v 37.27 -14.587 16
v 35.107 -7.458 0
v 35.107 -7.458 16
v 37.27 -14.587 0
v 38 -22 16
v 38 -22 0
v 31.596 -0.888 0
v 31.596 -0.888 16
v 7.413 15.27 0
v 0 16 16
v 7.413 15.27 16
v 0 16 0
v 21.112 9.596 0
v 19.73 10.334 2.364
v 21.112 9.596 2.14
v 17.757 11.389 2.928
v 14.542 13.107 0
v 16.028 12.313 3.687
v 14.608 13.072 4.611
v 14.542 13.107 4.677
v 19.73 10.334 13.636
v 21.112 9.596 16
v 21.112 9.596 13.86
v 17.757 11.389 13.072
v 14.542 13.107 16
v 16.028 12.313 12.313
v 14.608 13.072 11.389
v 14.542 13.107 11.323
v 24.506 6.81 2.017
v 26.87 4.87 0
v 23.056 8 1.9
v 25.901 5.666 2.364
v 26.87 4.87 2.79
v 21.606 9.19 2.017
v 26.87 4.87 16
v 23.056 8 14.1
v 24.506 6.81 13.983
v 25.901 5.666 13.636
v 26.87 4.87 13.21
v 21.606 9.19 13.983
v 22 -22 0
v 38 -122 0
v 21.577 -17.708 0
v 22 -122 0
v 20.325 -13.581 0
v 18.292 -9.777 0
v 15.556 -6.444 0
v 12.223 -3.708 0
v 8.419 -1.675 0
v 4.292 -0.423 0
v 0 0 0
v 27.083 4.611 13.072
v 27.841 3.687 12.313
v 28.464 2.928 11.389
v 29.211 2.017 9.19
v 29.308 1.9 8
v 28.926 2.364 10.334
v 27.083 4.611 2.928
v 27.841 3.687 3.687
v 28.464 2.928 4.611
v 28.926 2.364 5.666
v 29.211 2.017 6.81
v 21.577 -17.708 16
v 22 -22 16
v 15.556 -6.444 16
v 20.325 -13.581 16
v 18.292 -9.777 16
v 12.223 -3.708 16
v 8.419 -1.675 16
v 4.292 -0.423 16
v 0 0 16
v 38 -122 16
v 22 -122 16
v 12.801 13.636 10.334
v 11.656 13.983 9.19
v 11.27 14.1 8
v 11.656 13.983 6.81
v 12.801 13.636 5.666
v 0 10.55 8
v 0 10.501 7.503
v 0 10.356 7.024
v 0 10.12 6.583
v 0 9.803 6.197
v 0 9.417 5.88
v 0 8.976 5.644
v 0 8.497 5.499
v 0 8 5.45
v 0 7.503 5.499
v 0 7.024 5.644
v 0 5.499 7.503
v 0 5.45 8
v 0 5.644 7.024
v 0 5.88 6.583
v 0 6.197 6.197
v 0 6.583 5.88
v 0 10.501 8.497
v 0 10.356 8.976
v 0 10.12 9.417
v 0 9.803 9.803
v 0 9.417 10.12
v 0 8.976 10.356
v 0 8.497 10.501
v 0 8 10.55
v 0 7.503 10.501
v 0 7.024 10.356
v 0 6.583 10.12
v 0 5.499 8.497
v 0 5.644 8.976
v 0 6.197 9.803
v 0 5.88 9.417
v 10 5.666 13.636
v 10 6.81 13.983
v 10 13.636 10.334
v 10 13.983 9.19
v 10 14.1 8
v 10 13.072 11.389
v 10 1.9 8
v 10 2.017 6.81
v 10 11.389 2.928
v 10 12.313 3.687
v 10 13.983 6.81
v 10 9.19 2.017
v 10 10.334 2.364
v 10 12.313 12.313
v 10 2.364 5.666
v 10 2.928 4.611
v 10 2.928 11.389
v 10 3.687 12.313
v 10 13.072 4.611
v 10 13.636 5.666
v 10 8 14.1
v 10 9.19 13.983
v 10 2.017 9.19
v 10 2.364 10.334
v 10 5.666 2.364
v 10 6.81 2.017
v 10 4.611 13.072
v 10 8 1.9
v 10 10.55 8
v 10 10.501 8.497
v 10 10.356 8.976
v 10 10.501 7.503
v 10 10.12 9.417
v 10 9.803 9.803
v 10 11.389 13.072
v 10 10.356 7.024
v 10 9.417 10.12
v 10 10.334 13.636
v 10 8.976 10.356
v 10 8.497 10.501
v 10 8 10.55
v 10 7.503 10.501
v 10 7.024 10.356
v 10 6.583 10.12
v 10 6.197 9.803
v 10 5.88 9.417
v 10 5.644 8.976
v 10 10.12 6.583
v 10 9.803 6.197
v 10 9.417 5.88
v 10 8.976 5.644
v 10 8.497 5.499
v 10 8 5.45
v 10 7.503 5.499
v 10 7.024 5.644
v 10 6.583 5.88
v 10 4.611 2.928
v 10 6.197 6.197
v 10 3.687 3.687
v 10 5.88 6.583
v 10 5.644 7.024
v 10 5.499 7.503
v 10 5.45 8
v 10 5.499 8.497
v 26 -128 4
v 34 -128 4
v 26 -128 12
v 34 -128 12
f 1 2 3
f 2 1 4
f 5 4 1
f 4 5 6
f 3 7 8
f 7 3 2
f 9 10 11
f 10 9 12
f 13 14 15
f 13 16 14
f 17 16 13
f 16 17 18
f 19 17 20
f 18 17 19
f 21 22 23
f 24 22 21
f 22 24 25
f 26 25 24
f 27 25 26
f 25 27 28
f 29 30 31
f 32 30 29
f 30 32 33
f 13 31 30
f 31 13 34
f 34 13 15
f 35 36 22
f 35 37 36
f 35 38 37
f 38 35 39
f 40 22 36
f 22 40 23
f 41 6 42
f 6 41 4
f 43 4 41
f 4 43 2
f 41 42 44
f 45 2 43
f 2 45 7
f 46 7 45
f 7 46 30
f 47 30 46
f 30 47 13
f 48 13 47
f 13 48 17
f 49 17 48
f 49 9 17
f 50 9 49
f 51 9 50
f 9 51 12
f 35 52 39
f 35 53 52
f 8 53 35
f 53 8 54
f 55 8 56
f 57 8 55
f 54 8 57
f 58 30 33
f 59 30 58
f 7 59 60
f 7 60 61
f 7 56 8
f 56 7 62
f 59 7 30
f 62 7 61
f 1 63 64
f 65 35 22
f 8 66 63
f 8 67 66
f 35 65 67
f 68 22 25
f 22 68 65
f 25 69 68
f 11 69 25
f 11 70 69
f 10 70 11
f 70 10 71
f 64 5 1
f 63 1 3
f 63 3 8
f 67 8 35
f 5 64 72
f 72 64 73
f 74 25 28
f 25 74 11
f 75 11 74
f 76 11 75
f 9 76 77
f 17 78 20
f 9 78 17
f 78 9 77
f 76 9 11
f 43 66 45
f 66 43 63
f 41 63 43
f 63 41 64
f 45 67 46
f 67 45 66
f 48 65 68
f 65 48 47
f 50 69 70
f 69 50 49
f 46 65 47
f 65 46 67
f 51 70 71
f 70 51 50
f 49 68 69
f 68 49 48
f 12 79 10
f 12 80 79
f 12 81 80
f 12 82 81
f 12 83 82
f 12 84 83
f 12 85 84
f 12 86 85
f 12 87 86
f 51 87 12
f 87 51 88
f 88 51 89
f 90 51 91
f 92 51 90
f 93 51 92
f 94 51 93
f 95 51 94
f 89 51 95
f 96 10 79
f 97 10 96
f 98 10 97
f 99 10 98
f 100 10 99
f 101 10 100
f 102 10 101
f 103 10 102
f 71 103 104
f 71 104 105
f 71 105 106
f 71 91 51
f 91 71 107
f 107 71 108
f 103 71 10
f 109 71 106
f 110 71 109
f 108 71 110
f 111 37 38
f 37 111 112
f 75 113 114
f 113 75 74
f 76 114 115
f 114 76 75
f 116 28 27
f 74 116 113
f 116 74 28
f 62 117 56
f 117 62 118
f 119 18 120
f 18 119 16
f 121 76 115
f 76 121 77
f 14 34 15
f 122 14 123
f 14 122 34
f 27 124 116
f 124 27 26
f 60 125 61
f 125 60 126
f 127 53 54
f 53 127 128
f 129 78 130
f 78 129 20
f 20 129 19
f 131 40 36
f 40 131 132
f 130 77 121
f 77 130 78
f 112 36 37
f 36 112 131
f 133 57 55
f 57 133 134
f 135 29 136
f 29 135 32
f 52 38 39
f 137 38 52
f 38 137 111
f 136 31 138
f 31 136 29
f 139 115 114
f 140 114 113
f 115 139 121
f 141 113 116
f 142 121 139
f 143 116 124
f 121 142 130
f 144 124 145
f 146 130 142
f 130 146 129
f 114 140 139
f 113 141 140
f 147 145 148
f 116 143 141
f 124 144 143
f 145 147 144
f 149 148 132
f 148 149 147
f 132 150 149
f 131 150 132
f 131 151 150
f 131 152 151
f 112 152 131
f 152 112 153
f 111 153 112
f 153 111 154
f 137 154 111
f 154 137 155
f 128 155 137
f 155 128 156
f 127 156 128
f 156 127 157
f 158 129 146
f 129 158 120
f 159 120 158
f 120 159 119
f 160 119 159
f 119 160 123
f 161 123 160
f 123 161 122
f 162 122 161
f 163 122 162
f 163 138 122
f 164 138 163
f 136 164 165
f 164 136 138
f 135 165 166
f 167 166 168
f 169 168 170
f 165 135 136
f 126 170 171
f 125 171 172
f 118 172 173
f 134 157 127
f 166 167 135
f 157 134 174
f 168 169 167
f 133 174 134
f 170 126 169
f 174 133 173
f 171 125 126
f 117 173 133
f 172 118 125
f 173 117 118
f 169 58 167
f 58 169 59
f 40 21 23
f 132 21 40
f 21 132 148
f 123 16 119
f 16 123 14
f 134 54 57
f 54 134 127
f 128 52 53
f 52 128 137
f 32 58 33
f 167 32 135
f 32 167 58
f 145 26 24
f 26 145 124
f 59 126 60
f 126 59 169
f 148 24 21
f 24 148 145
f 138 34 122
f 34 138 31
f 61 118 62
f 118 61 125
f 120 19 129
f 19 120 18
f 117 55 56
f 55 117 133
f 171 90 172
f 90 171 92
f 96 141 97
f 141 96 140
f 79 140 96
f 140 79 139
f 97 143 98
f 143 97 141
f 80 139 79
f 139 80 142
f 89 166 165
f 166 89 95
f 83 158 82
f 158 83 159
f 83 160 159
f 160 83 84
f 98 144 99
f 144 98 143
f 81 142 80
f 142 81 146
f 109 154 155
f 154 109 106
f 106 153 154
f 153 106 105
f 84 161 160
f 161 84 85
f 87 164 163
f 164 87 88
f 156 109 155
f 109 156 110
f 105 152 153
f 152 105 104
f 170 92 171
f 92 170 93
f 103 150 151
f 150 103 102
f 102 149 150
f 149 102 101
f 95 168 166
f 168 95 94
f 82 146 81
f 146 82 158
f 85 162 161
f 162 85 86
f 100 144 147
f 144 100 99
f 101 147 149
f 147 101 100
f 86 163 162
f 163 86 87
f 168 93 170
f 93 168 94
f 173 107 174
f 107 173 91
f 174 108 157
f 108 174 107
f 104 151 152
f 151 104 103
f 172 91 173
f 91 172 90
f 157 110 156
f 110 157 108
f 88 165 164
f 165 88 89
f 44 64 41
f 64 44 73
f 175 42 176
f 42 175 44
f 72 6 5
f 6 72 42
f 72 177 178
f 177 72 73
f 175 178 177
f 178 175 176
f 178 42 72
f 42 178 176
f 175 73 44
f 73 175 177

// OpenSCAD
// file: ../lib/m5screw.scad
/**
 * Martin Egli
 * 2021-11-03
 * M5 screw cut outs
 */

module m5ScrewCut(len = 10, loc_res = 32) {
    translate([0, 0, 0])
    cylinder(d = 5.1, h = len, $fn = loc_res);
}
/*
module m5SinkHeadCut(len = 4, loc_res = 32) {
    translate([0, 0, 0])
    cylinder(d1 = 3.2, d2 = 6.6, h = 2, $fn = loc_res);
    translate([0, 0, 2])
    cylinder(d = 6.6, h = len, $fn = loc_res);
}*/
module m5CylinderHeadCut(len = 4, loc_res = 32) {
    translate([0, 0, 0])
    cylinder(d = 9.7, h = len, $fn = loc_res);
}

module m5WasherCut(washer_dia = 12.2, len = 4, loc_res = 32) {
    translate([0, 0, 0])
    cylinder(d = washer_dia, h = len, $fn = loc_res);
}

module m5NutCut() {
    translate([0, 0, 0])
    cylinder(d = 9, h = 4+4, $fn = 6);
}
/*
module m5SinkHeadScewNutCut(len = 10, loc_res = 32) {
    translate([0, 0, len])
    m3SinkHeadCut(4, loc_res);
    m3ScrewCut(len+1, loc_res);
    m3NutCut();
}
*/
module m5CylinderHeadScewNutCut(len = 10, loc_res = 32) {
    translate([0, 0, len])
    m5CylinderHeadCut(6, loc_res);
    m5ScrewCut(len+1, loc_res);
    m5NutCut();
}

module m5CylinderHeadWasherScewNutCut(len = 10, washer_dia = 12.2, loc_res = 32) {
    translate([0, 0, len])
    m5WasherCut(washer_dia, 30, loc_res);
    m5ScrewCut(len+1, loc_res);
    m5NutCut();
}

module m5TestingCylinderScrew(col = "Red", len = 20, loc_res = 32) {
    color(col) {
        translate([0, 0, 0])
        cylinder(d = 5-1, h = len, $fn = loc_res);
        translate([0, 0, 0])
        cylinder(d = 9-1, h = 4, $fn = 6);
        translate([0, 0, len])
        cylinder(d = 9.5-1, h = 4, $fn = loc_res);
    }
}

//m5SinkHeadScewNutCut(20);
//m5CylinderHeadScewNutCut(15);
//m5CylinderHeadWasherScewNutCut(20);
m5TestingCylinderScrew();
// file: ../lib/m3screw.scad
/**
 * Martin Egli
 * 2021-11-01
 * M3 screw cut outs
 */

module m3ScrewCut(len = 10, loc_res = 32) {
    translate([0, 0, 0])
    cylinder(d = 3.2, h = len, $fn = loc_res);
}

module m3SinkHeadCut(len = 4, loc_res = 32) {
    translate([0, 0, 0])
    cylinder(d1 = 3.2, d2 = 6.6, h = 2, $fn = loc_res);
    translate([0, 0, 2])
    cylinder(d = 6.6, h = len, $fn = loc_res);
}
module m3CylinderHeadCut(len = 4, loc_res = 32) {
    translate([0, 0, 0])
    cylinder(d = 6, h = len, $fn = loc_res);
}

module m3NutCut() {
    translate([0, 0, 0])
    cylinder(d = 6.6, h = 4, $fn = 6);
}

module m3SinkHeadScewNutCut(len = 10, loc_res = 32) {
    translate([0, 0, len])
    m3SinkHeadCut(4, loc_res);
    m3ScrewCut(len+1, loc_res);
    m3NutCut();
}

module m3CylinderHeadScewNutCut(len = 10, loc_res = 32) {
    translate([0, 0, len])
    m3CylinderHeadCut(4, loc_res);
    m3ScrewCut(len+1, loc_res);
    m3NutCut();
}

m3SinkHeadScewNutCut(20);
//m3CylinderHeadScewNutCut(15);
// main file
/**
 * Martin Egli
 * 2021-11-01
 * Handschuherweiterung für die Garderobe
 */
use<../lib/m3screw.scad>;
use<../lib/m5screw.scad>;

module baseGard(loc_res = 256) {
    translate([0, 250/2, 250/2])
    rotate([0, 90, 0])
    
    difference() {
        translate([0, 0, 0])
        cylinder(r = 250+15, h = 15, $fn = loc_res);
        translate([0, 0, -1])
        cylinder(r = 250, h = 15+2, $fn = loc_res);
        
        translate([0, 0, -1])
        cube([301, 301, 17]);
        translate([-300, -300, -1])
        cube([301, 301, 17]);
        translate([-300, 0, -1])
        cube([301, 301, 17]);
    }
}

module simpleGarderobeBase(wid = 16) {
    translate([-wid/2, -50, -wid/2])
    cube([wid, 100, wid]);
}

module plateA(show_final = 0, loc_res = 32) {
    difference() {
        translate([0, 0, 0])
        cube([40, 40, 6]);
    
        translate([5, 5, -1])
        m3CylinderHeadScewNutCut(14);
        translate([5, 40-5, 17])
        rotate([180, 0, 0])
        m3CylinderHeadScewNutCut(14);
        translate([40-5, 40-5, -1])
        m3CylinderHeadScewNutCut(14);
        translate([40-5, 5, 17])
        rotate([180, 0, 0])
        m3CylinderHeadScewNutCut(14);
    }
    
    translate([15, 20, -15])
    rotate([90, 0, 90])
    minkowski() {
        difference() {
            union() {
                translate([-20+2, 0, 2])
                cube([40-4, 20-2, 10-4]);
                translate([0, 0, 2])
                cylinder(d = 40-4, h = 10-4, $fn = loc_res);
            }
            translate([0, 0, -1])
            cylinder(d = 25+2, h = 12, $fn = loc_res);
        }
        if(show_final) {
            sphere(r = 2, $fn = loc_res);
        }
    }
}
module plateB() {
    difference() {
        translate([0, 0, 0])
        cube([40, 40, 6]);
        
        translate([5, 5, -11])
        m3CylinderHeadScewNutCut(14);
        translate([5, 40-5, 7])
        rotate([180, 0, 0])
        m3CylinderHeadScewNutCut(14);
        translate([40-5, 40-5, -11])
        m3CylinderHeadScewNutCut(14);
        translate([40-5, 5, 7])
        rotate([180, 0, 0])
        m3CylinderHeadScewNutCut(14);
    }
}

module plateC() {
    difference() {
        translate([0, 0, 0])
        cube([11, 40, 16]);
        
        translate([5, 5, -10])
        m3CylinderHeadScewNutCut(40);
        translate([5, 40-5, 30])
        rotate([180, 0, 0])
        m3CylinderHeadScewNutCut(40);
    
        translate([-1, 20, 8])
        rotate([0, 90, 0])
        rotate([0, 0, 90])
        m5CylinderHeadScewNutCut(20);
        
        /* // see inside for screw length
        translate([0, 10, -1])
        cube([20, 10, 20]);
        */
    }
}

module arcQuadrant(middle_dia = 30+8, wid = 16, show_quad = 1, loc_res = 32) {
    difference() {
        translate([0, 0, 0])
        cylinder(r = middle_dia, h = wid, $fn = loc_res);
        translate([0, 0, -1])
        cylinder(r = middle_dia-wid, h = wid+2, $fn = loc_res);
        
        if(show_quad != 1) {
            translate([0, 0, -1])
            cube([(middle_dia+wid/2), (middle_dia+wid/2), wid+2]);
        }
        if(show_quad != 2) {
            translate([-(middle_dia+wid/2), 0, -1])
            cube([(middle_dia+wid/2), (middle_dia+wid/2), wid+2]);
        }
        if(show_quad != 3) {
            translate([-(middle_dia+wid/2), -(middle_dia+wid/2), -1])
            cube([(middle_dia+wid/2), (middle_dia+wid/2), wid+2]);
        }
        if(show_quad != 4) {
            translate([0, -(middle_dia+wid/2), -1])
            cube([(middle_dia+wid/2), (middle_dia+wid/2), wid+2]);
        }
    }
}

module armD(loc_res = 32) {
    difference() {
        translate([0, -(30-8), 0])
        arcQuadrant(30+8, 16, 1);
            
        translate([-1-9, 8, 8])
        rotate([0, 90, 0])
        rotate([0, 0, 90])
        m5CylinderHeadWasherScewNutCut(20);
        
        /* // see inside for screw length
        translate([0, 10, -1])
        cube([20, 10, 20]);
        */
    
    }
    /* // testing M5 x 20 mm screw
    translate([-1-7, 8, 8])
    rotate([0, 90, 0])
    rotate([0, 0, 90])
    m5TestingCylinderScrew();
    */
    
    hull() {
    translate([(30-8), -(30-8)-100, 0])
    cube([16, 100, 16]);
    
    translate([(30-8)+4, -(30-8)-100-6, 4])
    cube([8, 8, 8]);
    }
    
}

/*
simpleGarderobeBase();
translate([-20, 0, 16/2])
plateB();
translate([-20, 0, -16/2-6])
plateA(0);

translate([9+1, 0, -8]) {
    plateC();
    translate([11, 12, 0])
    armD();
}
*/

armD();
